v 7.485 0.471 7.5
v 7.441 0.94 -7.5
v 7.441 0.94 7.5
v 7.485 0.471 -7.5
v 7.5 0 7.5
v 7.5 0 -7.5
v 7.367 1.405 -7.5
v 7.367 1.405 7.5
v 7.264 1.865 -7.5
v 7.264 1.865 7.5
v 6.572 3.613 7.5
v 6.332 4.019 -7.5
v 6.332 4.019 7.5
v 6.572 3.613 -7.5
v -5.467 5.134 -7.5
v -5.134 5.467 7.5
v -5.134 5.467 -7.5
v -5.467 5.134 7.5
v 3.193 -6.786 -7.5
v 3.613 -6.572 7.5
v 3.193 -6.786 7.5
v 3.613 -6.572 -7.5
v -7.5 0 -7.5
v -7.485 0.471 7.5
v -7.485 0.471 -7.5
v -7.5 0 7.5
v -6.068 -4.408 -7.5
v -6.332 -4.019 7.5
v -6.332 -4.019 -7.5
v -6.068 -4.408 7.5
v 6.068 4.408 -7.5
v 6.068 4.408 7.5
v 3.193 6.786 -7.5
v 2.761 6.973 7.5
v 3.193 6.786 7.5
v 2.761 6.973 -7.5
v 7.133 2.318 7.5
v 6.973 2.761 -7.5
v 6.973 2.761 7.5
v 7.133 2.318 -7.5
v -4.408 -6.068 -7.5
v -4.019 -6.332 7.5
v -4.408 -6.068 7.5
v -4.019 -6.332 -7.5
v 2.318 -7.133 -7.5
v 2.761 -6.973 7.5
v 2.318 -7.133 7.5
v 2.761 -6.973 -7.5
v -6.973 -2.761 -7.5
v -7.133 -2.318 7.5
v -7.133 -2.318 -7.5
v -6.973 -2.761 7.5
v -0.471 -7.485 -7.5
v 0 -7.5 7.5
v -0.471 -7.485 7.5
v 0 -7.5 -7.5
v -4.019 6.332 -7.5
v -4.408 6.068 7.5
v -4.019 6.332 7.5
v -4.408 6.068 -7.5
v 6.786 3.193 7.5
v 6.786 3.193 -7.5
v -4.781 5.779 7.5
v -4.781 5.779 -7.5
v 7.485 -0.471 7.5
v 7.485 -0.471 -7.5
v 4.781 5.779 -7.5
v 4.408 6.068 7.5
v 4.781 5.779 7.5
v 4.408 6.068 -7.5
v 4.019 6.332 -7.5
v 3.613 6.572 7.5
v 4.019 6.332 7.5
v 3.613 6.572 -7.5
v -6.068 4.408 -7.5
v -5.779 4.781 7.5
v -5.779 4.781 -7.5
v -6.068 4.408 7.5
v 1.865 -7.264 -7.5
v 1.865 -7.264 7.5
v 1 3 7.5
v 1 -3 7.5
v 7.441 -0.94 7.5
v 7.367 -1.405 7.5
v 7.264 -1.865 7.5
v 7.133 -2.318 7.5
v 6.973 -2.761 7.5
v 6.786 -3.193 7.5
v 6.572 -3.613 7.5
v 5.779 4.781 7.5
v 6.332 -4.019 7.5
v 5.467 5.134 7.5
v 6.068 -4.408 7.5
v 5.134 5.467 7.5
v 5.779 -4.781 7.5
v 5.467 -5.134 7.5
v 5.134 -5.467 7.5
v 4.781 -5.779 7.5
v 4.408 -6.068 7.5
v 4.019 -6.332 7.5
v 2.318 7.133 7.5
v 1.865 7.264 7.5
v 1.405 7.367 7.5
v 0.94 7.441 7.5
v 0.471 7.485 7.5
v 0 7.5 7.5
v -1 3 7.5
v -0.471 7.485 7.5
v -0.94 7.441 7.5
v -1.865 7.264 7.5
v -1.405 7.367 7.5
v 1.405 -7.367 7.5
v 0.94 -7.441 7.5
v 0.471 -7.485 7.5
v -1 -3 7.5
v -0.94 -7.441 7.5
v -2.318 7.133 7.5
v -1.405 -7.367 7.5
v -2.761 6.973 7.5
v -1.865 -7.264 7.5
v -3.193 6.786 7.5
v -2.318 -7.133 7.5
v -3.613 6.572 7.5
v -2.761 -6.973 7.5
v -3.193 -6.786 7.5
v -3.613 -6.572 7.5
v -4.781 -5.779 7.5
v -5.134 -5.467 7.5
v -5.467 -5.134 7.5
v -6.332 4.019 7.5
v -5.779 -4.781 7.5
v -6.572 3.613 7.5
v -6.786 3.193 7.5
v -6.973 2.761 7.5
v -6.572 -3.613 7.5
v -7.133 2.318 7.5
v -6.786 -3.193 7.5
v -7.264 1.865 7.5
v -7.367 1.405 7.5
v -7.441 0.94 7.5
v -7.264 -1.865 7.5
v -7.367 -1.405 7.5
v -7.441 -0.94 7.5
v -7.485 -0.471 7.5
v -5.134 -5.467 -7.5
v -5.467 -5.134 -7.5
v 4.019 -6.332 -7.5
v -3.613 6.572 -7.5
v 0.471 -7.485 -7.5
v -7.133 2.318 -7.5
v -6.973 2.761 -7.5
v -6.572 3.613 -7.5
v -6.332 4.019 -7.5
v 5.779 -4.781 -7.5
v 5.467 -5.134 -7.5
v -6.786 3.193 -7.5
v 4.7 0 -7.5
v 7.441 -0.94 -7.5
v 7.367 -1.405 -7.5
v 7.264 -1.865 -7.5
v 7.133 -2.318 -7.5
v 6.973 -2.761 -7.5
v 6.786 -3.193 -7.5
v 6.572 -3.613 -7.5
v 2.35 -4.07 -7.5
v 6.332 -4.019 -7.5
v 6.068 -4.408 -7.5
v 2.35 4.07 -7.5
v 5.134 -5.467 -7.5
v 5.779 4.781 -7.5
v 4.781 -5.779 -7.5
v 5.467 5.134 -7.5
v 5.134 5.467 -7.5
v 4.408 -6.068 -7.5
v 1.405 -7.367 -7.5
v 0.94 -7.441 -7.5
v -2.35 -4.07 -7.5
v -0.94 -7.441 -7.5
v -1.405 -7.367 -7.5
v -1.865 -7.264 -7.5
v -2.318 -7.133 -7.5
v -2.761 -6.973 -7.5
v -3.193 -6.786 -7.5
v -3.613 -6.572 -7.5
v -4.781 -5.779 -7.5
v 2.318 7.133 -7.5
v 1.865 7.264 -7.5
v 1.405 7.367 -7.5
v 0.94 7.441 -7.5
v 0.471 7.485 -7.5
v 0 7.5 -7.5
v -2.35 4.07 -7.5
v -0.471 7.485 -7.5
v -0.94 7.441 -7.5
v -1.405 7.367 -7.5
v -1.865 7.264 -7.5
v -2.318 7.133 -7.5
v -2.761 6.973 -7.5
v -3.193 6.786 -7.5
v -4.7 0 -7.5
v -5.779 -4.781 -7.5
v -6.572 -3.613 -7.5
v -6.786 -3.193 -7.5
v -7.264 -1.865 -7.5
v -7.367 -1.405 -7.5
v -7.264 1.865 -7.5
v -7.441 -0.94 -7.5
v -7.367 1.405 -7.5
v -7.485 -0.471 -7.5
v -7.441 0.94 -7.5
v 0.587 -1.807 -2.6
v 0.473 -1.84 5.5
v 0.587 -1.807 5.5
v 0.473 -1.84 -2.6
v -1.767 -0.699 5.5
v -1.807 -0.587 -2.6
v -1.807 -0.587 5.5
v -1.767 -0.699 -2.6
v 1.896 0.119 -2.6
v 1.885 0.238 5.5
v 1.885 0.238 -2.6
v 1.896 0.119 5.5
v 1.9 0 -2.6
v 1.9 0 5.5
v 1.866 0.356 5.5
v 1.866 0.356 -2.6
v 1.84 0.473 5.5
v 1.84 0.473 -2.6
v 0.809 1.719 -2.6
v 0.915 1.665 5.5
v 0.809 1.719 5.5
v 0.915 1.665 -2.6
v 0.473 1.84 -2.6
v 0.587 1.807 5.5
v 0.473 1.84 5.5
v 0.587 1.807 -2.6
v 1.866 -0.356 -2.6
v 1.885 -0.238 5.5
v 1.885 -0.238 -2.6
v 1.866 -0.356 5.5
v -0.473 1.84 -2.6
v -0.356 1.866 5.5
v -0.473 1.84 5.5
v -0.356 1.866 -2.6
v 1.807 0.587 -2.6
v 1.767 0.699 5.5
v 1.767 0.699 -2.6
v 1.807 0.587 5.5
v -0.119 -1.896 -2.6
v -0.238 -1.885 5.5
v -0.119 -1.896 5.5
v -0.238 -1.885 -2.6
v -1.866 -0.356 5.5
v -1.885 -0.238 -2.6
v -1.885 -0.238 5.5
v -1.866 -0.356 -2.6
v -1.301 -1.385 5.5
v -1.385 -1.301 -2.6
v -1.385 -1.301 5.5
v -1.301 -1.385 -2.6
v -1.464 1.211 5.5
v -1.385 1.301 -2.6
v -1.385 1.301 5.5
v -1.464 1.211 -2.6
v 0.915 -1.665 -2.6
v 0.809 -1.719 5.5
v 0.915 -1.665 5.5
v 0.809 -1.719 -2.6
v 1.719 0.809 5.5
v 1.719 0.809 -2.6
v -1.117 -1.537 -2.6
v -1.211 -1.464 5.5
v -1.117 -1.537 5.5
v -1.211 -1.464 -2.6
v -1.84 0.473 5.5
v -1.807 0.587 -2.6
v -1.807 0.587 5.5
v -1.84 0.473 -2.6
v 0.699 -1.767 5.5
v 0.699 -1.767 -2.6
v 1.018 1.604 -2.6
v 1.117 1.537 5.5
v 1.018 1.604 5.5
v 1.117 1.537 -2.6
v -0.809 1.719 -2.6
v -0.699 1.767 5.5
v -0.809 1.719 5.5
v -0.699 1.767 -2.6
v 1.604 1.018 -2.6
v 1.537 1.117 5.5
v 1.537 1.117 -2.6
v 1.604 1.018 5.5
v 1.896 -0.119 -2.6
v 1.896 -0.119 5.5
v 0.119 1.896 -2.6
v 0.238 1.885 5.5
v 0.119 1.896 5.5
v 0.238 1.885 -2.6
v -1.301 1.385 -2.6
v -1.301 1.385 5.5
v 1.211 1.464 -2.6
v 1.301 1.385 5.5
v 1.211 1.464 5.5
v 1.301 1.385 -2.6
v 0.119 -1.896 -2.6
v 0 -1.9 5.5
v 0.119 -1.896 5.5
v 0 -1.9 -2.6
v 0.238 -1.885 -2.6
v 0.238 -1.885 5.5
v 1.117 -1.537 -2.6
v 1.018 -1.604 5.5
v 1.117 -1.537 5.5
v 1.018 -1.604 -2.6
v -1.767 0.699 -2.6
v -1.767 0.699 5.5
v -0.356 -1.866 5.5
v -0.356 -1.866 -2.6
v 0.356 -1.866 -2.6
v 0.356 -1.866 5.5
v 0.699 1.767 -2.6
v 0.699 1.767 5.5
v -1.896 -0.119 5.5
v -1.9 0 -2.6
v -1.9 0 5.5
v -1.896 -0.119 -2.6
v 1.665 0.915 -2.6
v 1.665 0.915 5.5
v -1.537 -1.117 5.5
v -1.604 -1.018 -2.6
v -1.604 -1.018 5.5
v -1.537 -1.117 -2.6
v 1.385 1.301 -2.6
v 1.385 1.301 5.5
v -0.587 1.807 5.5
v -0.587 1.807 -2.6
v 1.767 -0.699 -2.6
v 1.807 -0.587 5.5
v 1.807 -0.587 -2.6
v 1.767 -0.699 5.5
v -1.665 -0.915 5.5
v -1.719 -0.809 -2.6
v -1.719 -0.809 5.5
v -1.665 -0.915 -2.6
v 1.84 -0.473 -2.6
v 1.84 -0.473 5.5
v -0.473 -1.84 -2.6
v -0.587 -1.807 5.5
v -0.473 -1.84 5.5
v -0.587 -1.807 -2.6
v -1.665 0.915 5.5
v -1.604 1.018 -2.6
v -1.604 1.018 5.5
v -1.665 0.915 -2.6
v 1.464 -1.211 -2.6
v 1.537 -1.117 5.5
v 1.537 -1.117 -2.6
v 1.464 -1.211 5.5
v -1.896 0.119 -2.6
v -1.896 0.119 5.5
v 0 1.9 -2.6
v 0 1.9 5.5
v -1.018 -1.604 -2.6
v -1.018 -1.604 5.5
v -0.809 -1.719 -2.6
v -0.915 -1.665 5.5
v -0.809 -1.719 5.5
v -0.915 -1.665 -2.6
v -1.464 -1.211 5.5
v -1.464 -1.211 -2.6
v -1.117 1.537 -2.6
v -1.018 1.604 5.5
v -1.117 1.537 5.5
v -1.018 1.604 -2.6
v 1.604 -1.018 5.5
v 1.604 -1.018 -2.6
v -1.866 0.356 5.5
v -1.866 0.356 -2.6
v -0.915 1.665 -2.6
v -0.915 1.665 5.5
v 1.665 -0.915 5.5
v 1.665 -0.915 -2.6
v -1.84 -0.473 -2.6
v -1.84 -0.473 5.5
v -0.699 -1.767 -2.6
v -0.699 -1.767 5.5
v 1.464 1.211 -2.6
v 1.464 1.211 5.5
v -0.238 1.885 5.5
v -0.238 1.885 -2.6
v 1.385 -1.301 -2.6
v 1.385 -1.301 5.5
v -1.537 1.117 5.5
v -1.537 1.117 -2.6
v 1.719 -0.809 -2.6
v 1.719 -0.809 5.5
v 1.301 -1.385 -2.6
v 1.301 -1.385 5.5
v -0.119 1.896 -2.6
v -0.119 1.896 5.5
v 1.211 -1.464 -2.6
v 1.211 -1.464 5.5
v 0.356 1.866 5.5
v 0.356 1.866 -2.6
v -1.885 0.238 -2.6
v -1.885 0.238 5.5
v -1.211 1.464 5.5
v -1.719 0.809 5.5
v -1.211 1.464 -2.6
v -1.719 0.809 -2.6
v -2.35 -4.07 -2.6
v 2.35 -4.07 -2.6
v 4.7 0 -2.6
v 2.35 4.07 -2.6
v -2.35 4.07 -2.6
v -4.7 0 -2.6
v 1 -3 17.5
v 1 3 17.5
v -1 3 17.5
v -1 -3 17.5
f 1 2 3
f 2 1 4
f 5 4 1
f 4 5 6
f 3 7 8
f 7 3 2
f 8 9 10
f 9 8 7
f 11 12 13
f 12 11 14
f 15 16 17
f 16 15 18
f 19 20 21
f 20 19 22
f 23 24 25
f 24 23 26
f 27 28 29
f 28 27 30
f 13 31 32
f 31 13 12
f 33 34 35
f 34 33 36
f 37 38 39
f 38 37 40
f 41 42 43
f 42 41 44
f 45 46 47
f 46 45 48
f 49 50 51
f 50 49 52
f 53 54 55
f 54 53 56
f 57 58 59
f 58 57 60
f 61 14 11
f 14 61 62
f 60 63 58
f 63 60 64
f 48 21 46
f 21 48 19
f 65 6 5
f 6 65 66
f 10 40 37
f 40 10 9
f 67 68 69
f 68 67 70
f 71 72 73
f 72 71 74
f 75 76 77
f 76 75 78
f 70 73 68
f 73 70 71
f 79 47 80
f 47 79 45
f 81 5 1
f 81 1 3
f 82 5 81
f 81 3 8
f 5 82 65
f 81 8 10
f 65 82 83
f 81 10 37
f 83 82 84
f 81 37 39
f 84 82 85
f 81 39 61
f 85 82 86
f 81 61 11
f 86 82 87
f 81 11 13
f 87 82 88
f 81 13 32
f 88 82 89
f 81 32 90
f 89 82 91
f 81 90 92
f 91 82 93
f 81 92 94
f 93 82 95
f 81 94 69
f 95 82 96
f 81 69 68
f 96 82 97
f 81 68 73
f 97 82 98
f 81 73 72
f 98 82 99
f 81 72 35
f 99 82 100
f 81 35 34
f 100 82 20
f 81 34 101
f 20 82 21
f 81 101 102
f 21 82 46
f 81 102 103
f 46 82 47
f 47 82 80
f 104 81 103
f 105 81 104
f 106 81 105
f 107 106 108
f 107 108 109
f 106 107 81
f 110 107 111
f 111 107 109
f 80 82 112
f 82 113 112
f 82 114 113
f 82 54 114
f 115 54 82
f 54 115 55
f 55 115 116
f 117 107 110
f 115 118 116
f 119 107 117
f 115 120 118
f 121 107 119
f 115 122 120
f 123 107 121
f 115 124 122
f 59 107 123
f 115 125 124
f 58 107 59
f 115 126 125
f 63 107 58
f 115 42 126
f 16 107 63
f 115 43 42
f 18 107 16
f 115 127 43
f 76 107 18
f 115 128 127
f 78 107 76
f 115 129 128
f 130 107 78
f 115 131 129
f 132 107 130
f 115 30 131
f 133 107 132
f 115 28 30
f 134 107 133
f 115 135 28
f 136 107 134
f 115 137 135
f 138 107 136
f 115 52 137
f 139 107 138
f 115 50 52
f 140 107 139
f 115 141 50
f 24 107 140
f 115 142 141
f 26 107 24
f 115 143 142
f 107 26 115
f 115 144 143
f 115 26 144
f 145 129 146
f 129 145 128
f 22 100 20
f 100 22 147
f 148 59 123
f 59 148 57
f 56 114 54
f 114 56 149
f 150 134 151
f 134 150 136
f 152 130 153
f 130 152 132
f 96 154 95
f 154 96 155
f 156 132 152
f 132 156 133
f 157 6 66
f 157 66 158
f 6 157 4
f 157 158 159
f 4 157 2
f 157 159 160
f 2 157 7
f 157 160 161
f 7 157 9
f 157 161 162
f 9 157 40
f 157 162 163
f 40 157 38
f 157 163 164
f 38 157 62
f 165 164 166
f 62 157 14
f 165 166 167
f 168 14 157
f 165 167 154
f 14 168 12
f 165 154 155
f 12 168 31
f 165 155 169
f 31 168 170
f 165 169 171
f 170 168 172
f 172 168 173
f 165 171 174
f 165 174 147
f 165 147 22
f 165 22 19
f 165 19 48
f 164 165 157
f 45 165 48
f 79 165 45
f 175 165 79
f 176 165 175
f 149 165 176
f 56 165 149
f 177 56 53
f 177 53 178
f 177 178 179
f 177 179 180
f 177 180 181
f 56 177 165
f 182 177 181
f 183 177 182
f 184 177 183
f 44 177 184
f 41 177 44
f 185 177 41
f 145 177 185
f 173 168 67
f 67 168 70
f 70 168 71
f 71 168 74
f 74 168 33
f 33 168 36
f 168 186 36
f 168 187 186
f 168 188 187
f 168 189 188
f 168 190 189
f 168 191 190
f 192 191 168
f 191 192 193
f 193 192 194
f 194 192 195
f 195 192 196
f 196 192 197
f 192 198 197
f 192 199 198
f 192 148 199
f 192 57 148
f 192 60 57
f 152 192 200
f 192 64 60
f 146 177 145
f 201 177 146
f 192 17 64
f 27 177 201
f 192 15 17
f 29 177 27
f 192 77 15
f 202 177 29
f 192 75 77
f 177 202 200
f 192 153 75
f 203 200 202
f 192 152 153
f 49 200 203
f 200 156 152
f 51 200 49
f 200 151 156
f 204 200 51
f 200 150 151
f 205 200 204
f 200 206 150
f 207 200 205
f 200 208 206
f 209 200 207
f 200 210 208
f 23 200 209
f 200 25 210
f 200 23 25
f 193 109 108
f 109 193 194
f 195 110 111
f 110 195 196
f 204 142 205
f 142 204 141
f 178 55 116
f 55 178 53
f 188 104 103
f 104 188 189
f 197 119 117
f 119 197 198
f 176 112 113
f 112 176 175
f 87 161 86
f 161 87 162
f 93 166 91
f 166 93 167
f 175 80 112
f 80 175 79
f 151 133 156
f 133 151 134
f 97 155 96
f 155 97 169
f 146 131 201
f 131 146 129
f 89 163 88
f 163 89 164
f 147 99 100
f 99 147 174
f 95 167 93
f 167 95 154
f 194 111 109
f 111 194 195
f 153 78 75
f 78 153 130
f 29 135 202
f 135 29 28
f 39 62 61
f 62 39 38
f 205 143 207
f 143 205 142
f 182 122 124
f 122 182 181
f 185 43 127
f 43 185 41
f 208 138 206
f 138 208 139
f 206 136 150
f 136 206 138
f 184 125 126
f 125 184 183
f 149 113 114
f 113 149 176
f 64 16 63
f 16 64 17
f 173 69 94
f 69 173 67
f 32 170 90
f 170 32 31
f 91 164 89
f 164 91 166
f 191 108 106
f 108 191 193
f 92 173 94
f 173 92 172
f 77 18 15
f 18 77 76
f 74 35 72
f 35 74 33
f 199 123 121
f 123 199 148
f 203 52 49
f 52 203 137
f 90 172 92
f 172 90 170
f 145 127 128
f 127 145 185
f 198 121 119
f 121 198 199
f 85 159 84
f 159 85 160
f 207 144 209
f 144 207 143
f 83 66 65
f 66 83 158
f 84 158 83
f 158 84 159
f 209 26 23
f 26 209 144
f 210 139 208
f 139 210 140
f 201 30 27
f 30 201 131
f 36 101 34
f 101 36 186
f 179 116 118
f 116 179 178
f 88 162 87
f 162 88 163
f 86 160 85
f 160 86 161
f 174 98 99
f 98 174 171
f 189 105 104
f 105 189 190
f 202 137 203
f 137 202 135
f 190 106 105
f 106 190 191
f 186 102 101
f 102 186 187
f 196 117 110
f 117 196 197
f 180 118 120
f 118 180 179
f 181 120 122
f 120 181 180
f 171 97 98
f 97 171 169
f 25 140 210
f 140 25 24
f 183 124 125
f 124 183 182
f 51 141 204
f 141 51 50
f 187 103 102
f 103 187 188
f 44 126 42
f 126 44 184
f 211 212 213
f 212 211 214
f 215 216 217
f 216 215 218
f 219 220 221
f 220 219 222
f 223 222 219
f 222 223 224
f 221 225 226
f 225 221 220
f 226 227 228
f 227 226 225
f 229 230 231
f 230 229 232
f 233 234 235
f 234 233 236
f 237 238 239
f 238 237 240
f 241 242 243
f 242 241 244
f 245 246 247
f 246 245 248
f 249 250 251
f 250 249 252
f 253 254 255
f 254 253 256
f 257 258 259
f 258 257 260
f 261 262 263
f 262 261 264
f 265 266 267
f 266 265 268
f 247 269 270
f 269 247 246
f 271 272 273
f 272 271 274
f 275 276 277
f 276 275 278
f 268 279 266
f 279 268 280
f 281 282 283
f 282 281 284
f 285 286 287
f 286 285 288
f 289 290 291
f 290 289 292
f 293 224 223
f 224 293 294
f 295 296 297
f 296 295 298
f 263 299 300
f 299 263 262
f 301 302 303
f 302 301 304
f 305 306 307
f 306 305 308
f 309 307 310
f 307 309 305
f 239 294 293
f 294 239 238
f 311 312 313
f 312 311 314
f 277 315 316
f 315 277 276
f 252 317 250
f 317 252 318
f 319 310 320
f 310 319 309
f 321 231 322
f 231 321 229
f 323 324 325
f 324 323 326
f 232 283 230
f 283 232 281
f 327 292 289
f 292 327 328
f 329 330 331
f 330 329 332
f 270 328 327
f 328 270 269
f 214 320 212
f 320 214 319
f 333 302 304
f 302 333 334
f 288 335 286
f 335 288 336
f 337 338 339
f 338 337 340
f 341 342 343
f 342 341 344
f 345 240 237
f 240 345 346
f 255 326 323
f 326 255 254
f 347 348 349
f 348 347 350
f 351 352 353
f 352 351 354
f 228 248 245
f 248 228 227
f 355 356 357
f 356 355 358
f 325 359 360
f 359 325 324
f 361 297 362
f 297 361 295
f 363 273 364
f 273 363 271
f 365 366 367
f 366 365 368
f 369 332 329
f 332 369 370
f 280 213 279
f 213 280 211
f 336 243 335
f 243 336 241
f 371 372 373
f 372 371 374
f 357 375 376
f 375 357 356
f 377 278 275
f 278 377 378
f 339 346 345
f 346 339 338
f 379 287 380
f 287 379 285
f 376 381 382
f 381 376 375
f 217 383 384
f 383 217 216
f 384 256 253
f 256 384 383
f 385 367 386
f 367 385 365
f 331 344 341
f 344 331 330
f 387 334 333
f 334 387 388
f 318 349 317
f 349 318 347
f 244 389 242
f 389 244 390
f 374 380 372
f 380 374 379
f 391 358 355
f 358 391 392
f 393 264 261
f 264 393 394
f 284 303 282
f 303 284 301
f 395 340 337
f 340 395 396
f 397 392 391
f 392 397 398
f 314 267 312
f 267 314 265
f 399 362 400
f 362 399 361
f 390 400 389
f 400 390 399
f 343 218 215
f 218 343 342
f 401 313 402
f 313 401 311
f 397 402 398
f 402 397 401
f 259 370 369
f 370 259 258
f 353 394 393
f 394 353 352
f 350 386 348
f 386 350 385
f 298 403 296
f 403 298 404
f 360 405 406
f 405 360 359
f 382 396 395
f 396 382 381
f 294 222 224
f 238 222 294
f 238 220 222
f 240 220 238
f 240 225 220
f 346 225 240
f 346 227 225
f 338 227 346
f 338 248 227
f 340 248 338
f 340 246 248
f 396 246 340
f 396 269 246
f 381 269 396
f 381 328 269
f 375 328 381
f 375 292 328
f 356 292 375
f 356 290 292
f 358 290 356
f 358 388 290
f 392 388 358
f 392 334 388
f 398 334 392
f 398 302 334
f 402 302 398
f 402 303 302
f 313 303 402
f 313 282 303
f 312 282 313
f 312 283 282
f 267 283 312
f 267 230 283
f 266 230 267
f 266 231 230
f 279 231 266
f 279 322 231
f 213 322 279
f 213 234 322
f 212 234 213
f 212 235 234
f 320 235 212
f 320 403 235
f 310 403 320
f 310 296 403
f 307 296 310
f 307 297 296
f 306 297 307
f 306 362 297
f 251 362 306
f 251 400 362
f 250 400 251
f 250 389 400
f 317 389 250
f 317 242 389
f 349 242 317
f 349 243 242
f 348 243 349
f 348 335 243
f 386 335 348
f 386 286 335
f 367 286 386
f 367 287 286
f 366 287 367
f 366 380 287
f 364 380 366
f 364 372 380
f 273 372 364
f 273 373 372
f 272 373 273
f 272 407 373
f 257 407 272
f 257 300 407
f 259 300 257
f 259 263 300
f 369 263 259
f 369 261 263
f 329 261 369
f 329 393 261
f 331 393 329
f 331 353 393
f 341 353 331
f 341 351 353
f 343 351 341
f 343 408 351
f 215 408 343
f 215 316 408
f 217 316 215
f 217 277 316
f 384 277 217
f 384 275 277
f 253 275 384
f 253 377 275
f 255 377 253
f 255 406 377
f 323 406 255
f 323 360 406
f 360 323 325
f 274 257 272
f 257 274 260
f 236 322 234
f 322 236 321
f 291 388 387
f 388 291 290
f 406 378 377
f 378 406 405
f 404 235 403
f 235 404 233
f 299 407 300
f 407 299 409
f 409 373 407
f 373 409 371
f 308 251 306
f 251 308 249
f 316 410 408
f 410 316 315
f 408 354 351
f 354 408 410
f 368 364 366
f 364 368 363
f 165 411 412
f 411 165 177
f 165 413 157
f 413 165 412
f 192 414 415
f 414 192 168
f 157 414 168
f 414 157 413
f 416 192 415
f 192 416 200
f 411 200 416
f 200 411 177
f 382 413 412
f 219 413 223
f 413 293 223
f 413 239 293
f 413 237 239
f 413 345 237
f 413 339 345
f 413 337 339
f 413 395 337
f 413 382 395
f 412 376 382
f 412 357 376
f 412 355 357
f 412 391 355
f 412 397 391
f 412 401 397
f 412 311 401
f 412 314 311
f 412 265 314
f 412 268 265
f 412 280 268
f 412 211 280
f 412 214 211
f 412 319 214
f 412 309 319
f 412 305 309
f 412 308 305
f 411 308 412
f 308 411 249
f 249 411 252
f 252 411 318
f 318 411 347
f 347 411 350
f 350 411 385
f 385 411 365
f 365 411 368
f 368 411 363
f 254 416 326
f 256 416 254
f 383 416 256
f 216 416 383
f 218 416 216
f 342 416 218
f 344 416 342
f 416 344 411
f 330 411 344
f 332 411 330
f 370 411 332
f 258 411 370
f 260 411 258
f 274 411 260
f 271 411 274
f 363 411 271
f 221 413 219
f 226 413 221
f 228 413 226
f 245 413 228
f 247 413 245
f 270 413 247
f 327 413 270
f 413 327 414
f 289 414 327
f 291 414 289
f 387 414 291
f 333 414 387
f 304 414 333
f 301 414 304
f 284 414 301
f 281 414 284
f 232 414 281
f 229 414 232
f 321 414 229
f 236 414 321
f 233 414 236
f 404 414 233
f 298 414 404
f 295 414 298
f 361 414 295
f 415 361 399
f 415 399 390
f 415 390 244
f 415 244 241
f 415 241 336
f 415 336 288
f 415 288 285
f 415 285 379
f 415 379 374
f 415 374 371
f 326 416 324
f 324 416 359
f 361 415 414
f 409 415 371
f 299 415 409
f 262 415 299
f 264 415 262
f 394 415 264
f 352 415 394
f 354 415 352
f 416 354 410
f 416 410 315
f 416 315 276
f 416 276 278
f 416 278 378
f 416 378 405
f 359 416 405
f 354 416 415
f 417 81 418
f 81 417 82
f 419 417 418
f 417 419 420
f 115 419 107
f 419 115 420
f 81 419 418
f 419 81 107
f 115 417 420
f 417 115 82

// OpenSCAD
/* End stop striker for optical end stop
   -- Williams

http://www.amazon.com/OpenSCAD-3D-Printing-Al-Williams-ebook/dp/B00I6K19OM

The idea is to put an endstop bolt in through a
locknut (nylock) and then CA glue 
the nut to the body. This provides a narrow
striker for an optical end stop */


$fn=100+0;

// Main body diameter (mm)
main_diameter=15;
// Main body length (mm)
body_length=15;
// Nut diameter (mm; 8.5mm=#6)
nut_diameter=9.4;
// Nut height (mm; 5mm=#6)
nut_height=5;
// Depth to cut out nut (mm)
nut_depth=1;

// Striker length (mm)
striker_length=10;
// Striker width (mm)
striker_x=2;
// Striker height (mm)
striker_y=6;

// Bolt hole diameter (mm; 3.8=#6)
bolt_diameter=3.8;


module nutHole(size,height)
  {
  cylinder(r=size,h=height,$fn=6,center=[0,0]);
  }

union() {
translate([0,0,body_length/2+striker_length/2]) cube([striker_x,striker_y,striker_length],center=true);
difference() {
  cylinder(r=main_diameter/2,h=body_length,center=true);
  translate([0,0,-2]) cylinder(r=bolt_diameter/2,h=body_length,center=true);
translate([0,0,-(body_length/2+.1)]) nutHole(size=nut_diameter/2,height=nut_height);
}
}
